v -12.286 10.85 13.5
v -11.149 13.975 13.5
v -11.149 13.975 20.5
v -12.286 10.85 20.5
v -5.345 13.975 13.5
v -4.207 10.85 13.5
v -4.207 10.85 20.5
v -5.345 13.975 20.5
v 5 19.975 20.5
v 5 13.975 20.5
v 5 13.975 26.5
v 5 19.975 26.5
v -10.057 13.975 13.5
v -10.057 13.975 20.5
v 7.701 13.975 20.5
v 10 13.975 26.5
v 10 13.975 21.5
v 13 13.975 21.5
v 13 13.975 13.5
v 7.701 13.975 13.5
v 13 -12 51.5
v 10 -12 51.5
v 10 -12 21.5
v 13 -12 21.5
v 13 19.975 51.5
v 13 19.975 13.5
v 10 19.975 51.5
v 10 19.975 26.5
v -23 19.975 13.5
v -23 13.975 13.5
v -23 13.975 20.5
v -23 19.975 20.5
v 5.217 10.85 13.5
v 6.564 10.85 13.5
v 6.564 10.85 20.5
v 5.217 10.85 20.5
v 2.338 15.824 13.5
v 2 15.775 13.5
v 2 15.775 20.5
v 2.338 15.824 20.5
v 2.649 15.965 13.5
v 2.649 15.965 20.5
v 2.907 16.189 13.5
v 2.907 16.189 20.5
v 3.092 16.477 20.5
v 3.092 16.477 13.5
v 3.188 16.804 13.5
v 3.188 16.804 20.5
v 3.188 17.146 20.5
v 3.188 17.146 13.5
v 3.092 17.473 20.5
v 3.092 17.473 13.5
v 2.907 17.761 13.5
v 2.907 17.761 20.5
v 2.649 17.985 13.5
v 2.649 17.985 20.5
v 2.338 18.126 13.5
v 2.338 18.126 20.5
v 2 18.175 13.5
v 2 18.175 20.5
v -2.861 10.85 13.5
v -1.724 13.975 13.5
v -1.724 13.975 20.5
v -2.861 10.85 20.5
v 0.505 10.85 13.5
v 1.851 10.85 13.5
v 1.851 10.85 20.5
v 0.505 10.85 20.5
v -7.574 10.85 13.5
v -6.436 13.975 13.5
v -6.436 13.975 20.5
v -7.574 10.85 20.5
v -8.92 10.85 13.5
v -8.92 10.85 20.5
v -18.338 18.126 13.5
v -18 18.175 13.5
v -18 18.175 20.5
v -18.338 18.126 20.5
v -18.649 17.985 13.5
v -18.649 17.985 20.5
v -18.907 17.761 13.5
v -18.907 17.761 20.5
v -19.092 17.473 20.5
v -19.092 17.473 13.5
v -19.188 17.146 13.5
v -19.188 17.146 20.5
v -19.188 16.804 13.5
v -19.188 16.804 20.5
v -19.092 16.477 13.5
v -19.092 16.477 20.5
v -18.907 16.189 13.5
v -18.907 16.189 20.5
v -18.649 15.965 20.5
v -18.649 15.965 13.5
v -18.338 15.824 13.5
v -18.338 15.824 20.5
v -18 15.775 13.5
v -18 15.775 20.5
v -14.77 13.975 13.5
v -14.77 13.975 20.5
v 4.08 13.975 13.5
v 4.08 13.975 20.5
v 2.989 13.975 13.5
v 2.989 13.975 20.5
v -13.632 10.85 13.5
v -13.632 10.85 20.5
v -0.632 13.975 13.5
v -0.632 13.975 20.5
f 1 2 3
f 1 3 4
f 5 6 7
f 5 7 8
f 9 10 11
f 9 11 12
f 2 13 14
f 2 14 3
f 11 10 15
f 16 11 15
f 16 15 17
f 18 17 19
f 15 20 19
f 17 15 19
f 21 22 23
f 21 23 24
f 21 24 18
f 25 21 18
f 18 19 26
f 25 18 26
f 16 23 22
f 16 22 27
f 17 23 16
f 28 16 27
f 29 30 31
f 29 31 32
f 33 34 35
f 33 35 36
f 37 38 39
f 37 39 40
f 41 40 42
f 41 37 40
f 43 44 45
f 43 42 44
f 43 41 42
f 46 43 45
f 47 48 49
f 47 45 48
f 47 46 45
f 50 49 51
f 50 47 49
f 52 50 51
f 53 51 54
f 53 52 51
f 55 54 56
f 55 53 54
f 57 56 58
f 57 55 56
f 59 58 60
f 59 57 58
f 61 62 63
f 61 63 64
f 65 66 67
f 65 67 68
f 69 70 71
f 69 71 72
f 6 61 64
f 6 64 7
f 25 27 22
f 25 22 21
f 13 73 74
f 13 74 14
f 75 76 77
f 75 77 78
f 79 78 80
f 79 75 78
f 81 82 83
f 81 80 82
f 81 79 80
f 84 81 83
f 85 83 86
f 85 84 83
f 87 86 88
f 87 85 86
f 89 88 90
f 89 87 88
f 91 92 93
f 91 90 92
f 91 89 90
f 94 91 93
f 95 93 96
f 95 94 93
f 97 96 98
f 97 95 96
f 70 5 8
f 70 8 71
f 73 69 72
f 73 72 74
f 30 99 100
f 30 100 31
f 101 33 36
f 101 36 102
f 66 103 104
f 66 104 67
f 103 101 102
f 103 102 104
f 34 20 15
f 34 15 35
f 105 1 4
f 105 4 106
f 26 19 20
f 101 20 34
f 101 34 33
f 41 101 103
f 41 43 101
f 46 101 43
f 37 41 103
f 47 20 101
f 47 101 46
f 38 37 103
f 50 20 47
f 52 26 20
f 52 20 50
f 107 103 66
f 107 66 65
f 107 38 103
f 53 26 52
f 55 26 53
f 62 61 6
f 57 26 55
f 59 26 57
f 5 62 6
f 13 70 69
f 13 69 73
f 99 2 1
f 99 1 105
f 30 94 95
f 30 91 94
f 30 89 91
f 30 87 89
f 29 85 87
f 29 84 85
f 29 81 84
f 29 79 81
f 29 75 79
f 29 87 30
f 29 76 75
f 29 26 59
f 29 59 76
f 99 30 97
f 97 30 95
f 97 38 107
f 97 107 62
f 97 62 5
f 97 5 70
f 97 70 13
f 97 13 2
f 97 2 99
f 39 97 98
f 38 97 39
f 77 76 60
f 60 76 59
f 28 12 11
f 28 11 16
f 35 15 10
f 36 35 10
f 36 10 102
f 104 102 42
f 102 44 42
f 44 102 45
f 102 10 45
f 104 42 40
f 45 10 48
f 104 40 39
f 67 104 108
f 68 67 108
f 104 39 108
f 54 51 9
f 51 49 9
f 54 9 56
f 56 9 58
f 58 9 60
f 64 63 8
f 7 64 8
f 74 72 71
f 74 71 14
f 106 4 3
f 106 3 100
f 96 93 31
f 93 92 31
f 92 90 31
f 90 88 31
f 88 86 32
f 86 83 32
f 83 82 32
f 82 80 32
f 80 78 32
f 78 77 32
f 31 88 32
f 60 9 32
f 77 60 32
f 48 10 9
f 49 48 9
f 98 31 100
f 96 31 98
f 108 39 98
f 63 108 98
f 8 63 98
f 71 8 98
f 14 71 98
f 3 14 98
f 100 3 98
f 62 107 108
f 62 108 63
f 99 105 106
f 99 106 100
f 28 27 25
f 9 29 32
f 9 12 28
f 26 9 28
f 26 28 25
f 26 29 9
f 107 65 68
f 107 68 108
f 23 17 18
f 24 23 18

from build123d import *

# Parameters (mm, degrees)
BOSS_EXTRUDE1_START     = 13.5
BOSS_EXTRUDE1_DEPTH     = 7
BOSS_EXTRUDE2_START     = 20.5
SKETCH2_W               = 8
SKETCH2_H               = 6
BOSS_EXTRUDE2_DEPTH     = 6
BOSS_EXTRUDE3_START     = 21.5
SKETCH3_W               = 3
SKETCH3_H               = 31.975
BOSS_EXTRUDE3_DEPTH     = 30
CUT_EXTRUDE1_DEPTH      = 60.835195537
CUT_EXTRUDE1_DEPTH_BACK = 60.835195537
SKETCH4_W               = 20
SKETCH4_H               = 2.4
CUT_EXTRUDE2_DEPTH      = 60.835195537
CUT_EXTRUDE2_DEPTH_BACK = 60.835195537
SKETCH5_R               = 1.2


with BuildPart() as part:
    # Sketch1 → Boss-Extrude1 (new body)
    with BuildSketch(Plane.XY.offset(BOSS_EXTRUDE1_START)):
        Polygon((-23, 19.975), (13, 19.975), (13, 13.975), (7.70102766, 13.975), (6.563620678, 10.85), (5.217351773, 10.85), (4.079944791, 13.975), (2.988638679, 13.975), (1.851231697, 10.85), (0.504962793, 10.85), (-0.632444189, 13.975), (-1.723750301, 13.975), (-2.861157283, 10.85), (-4.207426188, 10.85), (-5.34483317, 13.975), (-6.436139281, 13.975), (-7.573546263, 10.85), (-8.919815168, 10.85), (-10.05722215, 13.975), (-11.148528262, 13.975), (-12.285935244, 10.85), (-13.632204148, 10.85), (-14.76961113, 13.975), (-23, 13.975), align=None)
    extrude(amount=BOSS_EXTRUDE1_DEPTH)

    # Sketch2 → Boss-Extrude2 (add)
    with BuildSketch(Plane.XY.offset(BOSS_EXTRUDE2_START)):
        with Locations((9, 16.975)):
            Rectangle(SKETCH2_W, SKETCH2_H)
    extrude(amount=BOSS_EXTRUDE2_DEPTH)

    # Sketch3 → Boss-Extrude3 (add)
    with BuildSketch(Plane.XY.offset(BOSS_EXTRUDE3_START)):
        with Locations((11.5, 3.9875)):
            Rectangle(SKETCH3_W, SKETCH3_H)
    extrude(amount=BOSS_EXTRUDE3_DEPTH)

    # Sketch4 → Cut-Extrude1 (cut, two sides: drawn at the far end of the back side and taken through both)
    with BuildSketch(Plane.XY.offset(-CUT_EXTRUDE1_DEPTH_BACK)):
        with Locations((-8, 16.975)):
            Rectangle(SKETCH4_W, SKETCH4_H)
    extrude(amount=CUT_EXTRUDE1_DEPTH + CUT_EXTRUDE1_DEPTH_BACK, mode=Mode.SUBTRACT)

    # Sketch5 → Cut-Extrude2 (cut, two sides: drawn at the far end of the back side and taken through both)
    with BuildSketch(Plane.XY.offset(-CUT_EXTRUDE2_DEPTH_BACK)):
        with Locations((-18, 16.975)):
            Circle(SKETCH5_R)
        with Locations((2, 16.975)):
            Circle(SKETCH5_R)
    extrude(amount=CUT_EXTRUDE2_DEPTH + CUT_EXTRUDE2_DEPTH_BACK, mode=Mode.SUBTRACT)


solid = part.part
